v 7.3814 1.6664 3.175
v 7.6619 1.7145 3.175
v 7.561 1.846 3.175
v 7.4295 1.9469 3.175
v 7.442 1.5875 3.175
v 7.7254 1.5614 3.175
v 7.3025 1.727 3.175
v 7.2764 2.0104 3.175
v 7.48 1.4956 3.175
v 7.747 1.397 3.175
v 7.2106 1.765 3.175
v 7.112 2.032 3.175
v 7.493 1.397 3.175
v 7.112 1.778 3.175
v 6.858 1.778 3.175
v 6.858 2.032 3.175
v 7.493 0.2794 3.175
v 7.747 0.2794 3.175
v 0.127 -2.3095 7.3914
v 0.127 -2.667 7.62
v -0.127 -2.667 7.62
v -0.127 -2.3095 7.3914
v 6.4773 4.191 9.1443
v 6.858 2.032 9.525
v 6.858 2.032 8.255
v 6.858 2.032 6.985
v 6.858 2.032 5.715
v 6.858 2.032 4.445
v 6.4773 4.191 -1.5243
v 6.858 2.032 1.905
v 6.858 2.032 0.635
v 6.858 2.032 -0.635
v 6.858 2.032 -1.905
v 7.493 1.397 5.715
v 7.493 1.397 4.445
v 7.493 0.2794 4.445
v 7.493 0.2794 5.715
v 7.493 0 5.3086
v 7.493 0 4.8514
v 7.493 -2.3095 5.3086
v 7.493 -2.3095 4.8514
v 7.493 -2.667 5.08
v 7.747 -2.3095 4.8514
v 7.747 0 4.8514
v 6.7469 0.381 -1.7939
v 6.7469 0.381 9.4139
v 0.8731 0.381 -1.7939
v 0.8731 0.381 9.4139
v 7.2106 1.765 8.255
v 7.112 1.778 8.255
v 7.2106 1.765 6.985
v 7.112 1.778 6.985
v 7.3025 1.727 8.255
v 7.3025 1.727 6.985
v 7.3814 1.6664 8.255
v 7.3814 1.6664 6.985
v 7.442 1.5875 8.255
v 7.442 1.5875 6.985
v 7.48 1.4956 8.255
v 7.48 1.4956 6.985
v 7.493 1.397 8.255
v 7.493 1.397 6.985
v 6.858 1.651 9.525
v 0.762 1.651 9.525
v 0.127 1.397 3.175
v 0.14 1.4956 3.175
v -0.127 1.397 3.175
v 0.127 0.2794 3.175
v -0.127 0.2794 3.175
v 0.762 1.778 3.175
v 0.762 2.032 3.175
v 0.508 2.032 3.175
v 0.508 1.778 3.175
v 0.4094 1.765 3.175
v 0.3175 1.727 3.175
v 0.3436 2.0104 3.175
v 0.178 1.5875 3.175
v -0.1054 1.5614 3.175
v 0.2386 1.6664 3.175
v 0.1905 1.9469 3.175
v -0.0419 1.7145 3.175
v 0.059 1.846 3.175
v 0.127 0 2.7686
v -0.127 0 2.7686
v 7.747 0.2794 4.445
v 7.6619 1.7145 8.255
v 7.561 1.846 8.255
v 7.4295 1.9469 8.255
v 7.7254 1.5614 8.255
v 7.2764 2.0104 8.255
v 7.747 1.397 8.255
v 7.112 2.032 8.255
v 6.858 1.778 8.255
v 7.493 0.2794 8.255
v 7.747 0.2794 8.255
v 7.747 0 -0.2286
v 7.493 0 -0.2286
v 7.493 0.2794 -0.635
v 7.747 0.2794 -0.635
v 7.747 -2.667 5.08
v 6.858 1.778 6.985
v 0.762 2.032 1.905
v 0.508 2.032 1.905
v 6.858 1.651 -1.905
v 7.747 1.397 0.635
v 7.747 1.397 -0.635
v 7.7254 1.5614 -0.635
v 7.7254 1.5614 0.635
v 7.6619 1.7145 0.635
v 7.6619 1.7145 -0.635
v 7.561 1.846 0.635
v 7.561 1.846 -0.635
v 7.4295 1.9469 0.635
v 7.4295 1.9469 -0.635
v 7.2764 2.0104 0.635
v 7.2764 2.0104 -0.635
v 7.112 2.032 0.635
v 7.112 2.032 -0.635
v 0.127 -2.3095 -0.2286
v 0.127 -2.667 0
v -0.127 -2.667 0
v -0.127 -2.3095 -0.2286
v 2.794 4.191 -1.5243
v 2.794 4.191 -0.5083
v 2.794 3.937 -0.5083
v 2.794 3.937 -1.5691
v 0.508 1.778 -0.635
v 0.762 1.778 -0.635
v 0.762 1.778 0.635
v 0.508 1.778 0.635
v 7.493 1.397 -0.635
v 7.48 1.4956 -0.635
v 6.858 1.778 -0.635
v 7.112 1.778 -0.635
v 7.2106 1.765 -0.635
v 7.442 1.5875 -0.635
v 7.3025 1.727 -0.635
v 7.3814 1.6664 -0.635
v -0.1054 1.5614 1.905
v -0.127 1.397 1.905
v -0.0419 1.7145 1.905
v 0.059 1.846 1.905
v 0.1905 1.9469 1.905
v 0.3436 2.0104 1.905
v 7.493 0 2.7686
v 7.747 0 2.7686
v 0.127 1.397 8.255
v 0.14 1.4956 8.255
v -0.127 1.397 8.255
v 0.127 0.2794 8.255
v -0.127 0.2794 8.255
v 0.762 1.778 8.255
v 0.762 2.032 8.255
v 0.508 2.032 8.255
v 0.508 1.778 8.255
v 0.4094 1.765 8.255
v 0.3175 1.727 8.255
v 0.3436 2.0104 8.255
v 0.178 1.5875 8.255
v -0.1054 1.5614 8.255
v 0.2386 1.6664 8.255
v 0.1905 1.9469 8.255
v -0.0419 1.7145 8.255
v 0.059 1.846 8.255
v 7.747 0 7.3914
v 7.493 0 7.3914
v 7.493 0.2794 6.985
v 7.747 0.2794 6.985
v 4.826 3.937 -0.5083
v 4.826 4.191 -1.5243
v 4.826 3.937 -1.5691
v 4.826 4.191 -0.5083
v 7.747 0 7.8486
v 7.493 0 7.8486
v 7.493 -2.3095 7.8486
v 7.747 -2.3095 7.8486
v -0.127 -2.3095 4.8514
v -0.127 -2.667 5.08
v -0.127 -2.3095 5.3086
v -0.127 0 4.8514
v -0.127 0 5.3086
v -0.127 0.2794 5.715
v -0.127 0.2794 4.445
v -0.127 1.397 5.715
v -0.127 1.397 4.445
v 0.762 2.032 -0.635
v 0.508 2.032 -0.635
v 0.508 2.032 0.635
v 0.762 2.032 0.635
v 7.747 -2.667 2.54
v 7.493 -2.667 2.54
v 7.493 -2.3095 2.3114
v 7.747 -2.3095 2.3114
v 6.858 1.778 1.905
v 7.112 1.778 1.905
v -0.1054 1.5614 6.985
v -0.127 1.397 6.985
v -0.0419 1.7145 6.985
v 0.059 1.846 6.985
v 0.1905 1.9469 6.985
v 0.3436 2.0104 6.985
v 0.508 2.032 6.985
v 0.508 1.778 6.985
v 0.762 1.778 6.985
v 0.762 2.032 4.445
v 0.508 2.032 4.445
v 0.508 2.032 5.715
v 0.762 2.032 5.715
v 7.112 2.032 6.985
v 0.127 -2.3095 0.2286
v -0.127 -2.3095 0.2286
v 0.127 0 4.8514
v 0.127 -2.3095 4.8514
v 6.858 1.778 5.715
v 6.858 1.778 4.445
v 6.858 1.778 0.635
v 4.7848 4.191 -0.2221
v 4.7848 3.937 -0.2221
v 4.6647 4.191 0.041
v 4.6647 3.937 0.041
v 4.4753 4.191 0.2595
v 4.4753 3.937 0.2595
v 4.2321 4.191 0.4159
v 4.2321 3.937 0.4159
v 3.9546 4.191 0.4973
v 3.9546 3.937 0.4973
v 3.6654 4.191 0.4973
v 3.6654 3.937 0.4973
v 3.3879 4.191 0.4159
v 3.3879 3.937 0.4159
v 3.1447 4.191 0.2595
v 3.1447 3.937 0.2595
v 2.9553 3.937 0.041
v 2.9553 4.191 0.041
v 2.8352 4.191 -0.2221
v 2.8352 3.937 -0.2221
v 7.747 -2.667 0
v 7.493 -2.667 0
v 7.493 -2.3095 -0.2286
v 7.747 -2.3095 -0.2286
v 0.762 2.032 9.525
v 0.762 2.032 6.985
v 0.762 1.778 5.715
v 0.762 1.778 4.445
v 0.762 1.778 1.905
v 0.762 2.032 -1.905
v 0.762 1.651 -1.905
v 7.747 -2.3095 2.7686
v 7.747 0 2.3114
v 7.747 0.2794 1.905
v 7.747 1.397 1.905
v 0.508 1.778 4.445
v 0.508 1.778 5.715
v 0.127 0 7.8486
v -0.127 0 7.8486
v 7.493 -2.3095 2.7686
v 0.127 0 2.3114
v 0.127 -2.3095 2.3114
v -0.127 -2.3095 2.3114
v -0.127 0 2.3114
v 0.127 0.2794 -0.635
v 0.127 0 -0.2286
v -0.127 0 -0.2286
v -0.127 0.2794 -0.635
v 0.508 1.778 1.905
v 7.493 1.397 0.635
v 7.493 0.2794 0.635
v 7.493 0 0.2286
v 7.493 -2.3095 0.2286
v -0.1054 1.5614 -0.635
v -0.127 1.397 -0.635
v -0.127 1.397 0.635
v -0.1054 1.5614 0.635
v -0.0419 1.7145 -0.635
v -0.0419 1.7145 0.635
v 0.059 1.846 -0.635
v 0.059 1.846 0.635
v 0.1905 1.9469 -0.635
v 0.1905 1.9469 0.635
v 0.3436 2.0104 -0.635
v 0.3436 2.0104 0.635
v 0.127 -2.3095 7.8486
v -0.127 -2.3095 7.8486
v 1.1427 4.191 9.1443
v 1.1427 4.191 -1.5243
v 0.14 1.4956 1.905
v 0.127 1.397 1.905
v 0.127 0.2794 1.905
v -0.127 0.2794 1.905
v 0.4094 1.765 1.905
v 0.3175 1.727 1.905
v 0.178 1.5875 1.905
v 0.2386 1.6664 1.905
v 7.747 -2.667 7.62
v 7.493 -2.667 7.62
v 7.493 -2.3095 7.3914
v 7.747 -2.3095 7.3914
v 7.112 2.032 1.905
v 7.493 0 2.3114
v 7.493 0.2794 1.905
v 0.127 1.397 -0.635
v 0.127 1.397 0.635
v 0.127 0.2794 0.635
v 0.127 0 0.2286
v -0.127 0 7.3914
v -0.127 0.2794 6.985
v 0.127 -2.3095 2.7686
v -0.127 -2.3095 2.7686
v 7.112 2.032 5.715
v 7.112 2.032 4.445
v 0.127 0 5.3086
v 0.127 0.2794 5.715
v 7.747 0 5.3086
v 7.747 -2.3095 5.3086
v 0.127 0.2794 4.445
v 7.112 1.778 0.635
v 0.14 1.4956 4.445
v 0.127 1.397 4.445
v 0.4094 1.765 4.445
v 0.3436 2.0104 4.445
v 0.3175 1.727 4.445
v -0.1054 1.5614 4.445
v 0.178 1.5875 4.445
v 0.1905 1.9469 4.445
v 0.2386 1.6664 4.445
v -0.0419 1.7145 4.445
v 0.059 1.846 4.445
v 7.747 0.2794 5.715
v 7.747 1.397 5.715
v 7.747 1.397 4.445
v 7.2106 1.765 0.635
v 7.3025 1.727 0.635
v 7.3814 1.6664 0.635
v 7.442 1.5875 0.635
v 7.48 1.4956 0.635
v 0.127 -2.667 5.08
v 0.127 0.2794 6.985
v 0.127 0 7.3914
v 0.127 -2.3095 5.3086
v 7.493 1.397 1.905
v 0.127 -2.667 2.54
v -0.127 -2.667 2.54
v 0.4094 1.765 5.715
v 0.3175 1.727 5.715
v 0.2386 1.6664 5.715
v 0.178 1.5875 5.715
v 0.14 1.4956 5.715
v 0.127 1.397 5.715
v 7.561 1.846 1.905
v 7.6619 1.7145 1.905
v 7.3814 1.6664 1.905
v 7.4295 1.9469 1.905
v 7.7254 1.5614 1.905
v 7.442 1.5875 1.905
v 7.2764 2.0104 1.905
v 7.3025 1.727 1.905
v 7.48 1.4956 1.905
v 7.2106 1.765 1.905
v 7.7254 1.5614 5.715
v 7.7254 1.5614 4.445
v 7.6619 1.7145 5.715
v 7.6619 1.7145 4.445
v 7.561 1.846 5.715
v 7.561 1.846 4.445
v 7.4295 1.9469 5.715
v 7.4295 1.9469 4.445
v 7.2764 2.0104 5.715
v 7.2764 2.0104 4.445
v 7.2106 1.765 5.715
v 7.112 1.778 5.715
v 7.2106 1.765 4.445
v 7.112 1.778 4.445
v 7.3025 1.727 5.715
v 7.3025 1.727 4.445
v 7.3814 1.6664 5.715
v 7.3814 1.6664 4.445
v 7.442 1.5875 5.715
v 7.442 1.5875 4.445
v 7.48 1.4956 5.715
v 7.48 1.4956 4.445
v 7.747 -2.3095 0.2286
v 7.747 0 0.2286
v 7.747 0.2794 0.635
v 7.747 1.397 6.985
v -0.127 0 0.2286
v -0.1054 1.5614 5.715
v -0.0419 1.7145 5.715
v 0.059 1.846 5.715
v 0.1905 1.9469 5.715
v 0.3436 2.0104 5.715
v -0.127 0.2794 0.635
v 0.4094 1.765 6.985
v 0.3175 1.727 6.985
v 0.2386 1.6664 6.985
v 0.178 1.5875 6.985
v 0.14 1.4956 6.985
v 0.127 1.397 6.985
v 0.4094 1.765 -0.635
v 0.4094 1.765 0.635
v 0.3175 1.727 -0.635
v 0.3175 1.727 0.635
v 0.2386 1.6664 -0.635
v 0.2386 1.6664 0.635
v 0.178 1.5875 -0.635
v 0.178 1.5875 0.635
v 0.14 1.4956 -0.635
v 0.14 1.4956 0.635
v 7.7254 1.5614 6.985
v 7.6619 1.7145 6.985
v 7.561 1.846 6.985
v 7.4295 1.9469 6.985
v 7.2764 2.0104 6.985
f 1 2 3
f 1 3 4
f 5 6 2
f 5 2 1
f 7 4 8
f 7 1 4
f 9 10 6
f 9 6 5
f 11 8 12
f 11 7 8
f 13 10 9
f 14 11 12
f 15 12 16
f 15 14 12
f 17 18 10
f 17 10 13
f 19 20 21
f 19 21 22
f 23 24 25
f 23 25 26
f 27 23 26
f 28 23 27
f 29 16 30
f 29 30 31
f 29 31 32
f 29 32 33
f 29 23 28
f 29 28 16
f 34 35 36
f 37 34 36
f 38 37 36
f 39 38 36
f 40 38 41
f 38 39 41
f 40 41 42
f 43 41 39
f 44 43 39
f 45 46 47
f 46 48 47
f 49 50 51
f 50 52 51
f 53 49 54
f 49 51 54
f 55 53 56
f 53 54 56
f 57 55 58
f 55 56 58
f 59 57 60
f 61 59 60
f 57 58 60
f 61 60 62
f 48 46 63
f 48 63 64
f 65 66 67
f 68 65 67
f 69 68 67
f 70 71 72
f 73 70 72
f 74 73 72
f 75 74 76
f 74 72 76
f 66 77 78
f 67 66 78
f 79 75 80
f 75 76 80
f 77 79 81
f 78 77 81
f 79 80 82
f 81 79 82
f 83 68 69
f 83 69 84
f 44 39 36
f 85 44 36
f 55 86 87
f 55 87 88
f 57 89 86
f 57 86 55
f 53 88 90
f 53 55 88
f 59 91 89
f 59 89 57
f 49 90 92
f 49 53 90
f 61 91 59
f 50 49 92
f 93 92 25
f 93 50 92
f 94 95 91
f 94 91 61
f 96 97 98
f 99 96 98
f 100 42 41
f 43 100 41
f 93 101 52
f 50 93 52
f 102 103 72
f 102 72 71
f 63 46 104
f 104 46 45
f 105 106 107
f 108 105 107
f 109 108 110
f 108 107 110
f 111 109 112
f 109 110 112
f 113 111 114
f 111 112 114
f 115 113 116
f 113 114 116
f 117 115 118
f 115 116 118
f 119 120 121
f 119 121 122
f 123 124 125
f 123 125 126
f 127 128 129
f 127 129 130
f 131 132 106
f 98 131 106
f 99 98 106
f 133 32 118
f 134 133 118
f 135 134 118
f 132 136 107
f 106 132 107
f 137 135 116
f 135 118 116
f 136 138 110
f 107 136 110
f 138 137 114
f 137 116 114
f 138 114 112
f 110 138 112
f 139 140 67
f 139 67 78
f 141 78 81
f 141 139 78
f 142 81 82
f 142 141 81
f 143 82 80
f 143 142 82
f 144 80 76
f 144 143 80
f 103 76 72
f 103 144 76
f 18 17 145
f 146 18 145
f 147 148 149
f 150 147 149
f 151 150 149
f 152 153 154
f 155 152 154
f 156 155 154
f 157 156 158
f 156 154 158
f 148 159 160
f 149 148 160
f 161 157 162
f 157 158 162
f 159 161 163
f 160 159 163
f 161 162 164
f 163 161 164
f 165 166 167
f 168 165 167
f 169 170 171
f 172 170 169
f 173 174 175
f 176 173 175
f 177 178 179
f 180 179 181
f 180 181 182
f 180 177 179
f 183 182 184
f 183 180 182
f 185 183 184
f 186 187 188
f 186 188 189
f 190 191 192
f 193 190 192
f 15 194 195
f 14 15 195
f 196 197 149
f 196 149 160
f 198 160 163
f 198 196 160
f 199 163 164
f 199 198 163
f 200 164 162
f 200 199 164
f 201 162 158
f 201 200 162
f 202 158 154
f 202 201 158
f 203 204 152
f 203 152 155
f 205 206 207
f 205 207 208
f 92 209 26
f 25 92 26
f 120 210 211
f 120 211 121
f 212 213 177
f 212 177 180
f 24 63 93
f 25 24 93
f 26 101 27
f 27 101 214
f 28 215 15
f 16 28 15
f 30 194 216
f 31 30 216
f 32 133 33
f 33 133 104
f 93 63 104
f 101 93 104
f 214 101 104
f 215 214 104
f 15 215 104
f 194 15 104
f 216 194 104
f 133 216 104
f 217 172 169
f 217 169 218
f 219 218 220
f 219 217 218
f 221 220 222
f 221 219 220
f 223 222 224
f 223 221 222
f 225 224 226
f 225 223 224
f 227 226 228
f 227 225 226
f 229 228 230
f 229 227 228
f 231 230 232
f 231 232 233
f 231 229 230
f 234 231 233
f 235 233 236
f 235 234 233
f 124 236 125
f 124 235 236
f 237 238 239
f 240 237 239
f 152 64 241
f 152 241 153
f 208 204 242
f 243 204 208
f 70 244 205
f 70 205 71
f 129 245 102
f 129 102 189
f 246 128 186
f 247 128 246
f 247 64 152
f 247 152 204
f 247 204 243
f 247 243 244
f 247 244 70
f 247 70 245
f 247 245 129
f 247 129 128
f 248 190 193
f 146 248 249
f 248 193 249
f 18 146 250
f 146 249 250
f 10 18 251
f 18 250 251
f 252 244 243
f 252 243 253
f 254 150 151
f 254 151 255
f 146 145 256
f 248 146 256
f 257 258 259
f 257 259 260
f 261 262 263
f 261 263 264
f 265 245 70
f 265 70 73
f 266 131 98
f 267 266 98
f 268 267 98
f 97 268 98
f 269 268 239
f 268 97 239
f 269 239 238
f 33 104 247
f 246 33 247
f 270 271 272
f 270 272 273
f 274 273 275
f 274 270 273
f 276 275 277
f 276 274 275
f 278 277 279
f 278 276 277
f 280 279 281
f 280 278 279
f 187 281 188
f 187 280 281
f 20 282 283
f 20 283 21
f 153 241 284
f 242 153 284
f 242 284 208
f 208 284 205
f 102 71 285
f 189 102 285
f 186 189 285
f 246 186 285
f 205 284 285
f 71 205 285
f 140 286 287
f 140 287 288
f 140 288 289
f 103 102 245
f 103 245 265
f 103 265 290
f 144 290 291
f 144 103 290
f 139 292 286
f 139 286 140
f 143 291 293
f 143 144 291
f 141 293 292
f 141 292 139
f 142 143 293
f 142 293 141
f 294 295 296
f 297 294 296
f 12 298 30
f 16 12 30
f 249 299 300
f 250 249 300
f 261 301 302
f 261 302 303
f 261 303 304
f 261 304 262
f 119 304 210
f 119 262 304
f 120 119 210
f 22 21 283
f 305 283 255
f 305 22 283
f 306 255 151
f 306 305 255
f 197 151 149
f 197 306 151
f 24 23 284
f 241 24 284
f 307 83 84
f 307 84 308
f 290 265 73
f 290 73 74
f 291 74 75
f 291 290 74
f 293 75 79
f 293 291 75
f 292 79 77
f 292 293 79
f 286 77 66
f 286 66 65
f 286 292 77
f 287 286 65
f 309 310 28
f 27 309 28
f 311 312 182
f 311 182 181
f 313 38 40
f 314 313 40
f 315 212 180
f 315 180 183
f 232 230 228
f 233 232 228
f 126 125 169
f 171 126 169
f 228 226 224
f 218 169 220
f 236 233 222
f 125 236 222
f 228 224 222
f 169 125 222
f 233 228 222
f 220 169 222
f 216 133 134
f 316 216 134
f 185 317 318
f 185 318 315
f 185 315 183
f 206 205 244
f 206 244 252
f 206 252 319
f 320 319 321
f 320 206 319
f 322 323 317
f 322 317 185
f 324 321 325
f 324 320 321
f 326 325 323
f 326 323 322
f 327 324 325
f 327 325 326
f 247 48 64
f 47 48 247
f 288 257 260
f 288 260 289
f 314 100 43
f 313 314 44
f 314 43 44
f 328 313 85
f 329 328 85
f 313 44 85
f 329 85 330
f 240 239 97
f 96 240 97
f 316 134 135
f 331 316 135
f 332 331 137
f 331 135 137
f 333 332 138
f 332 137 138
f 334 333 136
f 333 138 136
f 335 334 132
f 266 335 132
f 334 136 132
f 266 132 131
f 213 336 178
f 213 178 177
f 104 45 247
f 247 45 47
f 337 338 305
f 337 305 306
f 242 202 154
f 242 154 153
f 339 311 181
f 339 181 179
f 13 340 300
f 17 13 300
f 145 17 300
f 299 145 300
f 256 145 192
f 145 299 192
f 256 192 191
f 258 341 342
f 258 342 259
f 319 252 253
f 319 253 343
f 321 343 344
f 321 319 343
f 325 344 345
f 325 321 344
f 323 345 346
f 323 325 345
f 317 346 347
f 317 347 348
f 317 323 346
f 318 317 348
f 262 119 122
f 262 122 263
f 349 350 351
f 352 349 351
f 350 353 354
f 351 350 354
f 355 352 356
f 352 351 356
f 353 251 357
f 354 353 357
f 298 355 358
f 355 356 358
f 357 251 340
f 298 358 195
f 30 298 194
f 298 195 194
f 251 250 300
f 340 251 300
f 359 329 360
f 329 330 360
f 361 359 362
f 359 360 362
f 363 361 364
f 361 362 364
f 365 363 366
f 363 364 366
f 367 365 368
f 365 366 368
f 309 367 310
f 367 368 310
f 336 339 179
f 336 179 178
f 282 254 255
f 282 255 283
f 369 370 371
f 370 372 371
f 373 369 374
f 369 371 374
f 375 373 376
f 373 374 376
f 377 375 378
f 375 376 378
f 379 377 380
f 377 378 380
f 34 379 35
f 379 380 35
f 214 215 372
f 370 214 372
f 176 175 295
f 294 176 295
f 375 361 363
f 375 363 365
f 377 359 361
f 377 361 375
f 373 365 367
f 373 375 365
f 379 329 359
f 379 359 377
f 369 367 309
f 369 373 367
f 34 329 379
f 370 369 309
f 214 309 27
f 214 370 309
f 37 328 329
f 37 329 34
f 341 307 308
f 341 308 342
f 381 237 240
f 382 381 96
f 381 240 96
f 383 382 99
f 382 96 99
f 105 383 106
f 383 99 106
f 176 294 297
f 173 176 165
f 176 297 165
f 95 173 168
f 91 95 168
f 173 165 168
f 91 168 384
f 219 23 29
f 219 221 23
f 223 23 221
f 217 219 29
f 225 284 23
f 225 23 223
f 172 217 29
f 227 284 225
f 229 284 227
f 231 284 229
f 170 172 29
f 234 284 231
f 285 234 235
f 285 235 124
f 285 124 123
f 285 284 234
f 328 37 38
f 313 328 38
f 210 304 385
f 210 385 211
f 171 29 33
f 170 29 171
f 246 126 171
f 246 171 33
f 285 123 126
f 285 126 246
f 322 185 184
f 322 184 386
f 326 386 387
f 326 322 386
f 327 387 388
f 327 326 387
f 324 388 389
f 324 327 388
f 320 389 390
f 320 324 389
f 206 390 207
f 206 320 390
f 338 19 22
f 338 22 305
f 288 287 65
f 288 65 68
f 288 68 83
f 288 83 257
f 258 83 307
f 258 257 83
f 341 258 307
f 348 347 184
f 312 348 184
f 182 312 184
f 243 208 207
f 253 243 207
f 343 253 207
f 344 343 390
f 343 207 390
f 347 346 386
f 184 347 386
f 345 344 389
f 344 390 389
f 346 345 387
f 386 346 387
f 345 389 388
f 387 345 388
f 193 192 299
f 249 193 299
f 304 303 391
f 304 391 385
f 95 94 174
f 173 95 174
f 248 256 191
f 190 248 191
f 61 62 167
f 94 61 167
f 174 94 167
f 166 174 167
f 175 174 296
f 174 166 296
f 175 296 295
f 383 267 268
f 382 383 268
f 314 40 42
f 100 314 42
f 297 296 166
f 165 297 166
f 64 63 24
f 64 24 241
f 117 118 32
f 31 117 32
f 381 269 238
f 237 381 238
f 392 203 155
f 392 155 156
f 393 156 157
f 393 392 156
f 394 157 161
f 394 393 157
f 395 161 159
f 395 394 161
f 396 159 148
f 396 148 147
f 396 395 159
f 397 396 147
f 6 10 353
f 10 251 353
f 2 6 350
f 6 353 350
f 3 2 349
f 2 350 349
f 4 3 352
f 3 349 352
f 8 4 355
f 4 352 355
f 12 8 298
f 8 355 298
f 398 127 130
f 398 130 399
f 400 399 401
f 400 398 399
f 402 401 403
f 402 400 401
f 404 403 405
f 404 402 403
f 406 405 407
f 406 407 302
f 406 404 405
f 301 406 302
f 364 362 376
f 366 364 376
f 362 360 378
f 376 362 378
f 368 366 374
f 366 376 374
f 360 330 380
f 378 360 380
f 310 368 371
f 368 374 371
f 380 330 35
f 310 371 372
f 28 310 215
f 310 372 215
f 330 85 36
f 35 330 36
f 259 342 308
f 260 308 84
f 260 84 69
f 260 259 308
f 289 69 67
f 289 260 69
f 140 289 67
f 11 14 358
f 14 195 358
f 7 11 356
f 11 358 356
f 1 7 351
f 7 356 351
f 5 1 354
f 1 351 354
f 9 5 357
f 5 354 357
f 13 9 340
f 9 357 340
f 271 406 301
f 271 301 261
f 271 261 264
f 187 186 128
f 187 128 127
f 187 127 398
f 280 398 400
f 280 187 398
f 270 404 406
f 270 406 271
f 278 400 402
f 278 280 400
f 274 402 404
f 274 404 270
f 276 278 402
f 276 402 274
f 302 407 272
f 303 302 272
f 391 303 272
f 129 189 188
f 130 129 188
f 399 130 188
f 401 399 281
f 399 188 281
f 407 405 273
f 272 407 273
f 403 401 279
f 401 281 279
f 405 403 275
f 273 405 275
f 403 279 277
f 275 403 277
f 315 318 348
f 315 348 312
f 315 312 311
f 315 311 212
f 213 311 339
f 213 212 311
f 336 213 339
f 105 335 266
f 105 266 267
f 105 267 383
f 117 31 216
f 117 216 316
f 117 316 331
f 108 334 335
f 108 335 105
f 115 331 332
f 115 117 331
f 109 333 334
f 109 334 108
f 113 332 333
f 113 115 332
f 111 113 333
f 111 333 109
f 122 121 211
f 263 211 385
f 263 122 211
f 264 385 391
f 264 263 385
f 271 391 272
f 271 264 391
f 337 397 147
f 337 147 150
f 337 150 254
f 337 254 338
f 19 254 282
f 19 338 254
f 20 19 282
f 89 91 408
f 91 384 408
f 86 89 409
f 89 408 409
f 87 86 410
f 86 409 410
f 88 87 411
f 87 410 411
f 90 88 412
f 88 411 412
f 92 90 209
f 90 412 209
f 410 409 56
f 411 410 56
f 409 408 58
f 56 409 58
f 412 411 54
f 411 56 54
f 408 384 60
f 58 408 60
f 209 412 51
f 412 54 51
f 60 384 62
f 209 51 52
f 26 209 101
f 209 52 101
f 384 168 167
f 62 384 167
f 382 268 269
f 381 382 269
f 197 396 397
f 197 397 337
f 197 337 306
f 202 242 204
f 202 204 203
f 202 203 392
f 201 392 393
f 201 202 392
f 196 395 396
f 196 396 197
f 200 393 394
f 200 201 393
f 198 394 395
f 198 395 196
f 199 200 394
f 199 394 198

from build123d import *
from OCP.BRepFilletAPI import BRepFilletAPI_MakeChamfer

# Parameters (mm, degrees)
SKETCH1_W                = 11.43
SKETCH1_H                = 6.096
BASE_EXTRUDE_DEPTH       = 3.81
CHAMFER1_SIZE            = 2.159
CHAMFER1_SIZE2           = 0.380689951
CHAMFER2_SIZE            = 1.27
CHAMFER2_SIZE2           = 0.111110603
CUT_EXTRUDE1_DEPTH       = 0.254
BOSS_EXTRUDE_THIN1_DEPTH = 0.635
CUT_EXTRUDE2_DEPTH       = 0.254
CUT_EXTRUDE3_DEPTH       = 0.254
LPATTERN1_COUNT          = 4
LPATTERN1_PITCH          = 2.54
MIRROR1_COPY_1_DEPTH     = 0.635
MIRROR1_COPY_2_DEPTH     = 0.635
MIRROR1_COPY_3_DEPTH     = 0.635
MIRROR1_COPY_4_DEPTH     = 0.254
MIRROR1_COPY_5_DEPTH     = 0.254
MIRROR1_COPY_6_DEPTH     = 0.254
MIRROR1_COPY_7_DEPTH     = 0.254
MIRROR1_COPY_8_DEPTH     = 0.254
MIRROR1_COPY_9_DEPTH     = 0.254


with BuildPart() as part:
    # Sketch1 → Base-Extrude (new body)
    with BuildSketch(Plane(origin=(0, 0.381, 0), x_dir=(0, 0, -1), z_dir=(0, 1, 0))):
        with Locations((-3.81, -3.81)):
            Rectangle(SKETCH1_W, SKETCH1_H)
    extrude(amount=BASE_EXTRUDE_DEPTH)

    # Chamfer1: one chamfer whose edges measure the first distance from different faces: ONE call of the kernel's chamfer builder (chamfer() names one face for all edges)
    chamfer1_edges_1 = [part.edges().sort_by_distance(p)[0] for p in [
        (3.81, 4.191, 9.525),
    ]]
    chamfer1_side_1 = [part.faces().sort_by_distance(p)[0] for p in [
        (3.81, 2.286, 9.525),
    ]]
    chamfer1_edges_2 = [part.edges().sort_by_distance(p)[0] for p in [
        (6.858, 4.191, 3.81),
    ]]
    chamfer1_side_2 = [part.faces().sort_by_distance(p)[0] for p in [
        (6.858, 2.286, 3.81),
    ]]
    chamfer1_edges_3 = [part.edges().sort_by_distance(p)[0] for p in [
        (3.81, 4.191, -1.905),
    ]]
    chamfer1_side_3 = [part.faces().sort_by_distance(p)[0] for p in [
        (3.81, 2.286, -1.905),
    ]]
    chamfer1_edges_4 = [part.edges().sort_by_distance(p)[0] for p in [
        (0.762, 4.191, 3.81),
    ]]
    chamfer1_side_4 = [part.faces().sort_by_distance(p)[0] for p in [
        (0.762, 2.286, 3.81),
    ]]
    chamfer1 = BRepFilletAPI_MakeChamfer(part.part.solid().wrapped)
    for e in chamfer1_edges_1:
        chamfer1.Add(CHAMFER1_SIZE, CHAMFER1_SIZE2, e.wrapped, chamfer1_side_1[0].wrapped)  # the first distance lies on this face
    for e in chamfer1_edges_2:
        chamfer1.Add(CHAMFER1_SIZE, CHAMFER1_SIZE2, e.wrapped, chamfer1_side_2[0].wrapped)  # the first distance lies on this face
    for e in chamfer1_edges_3:
        chamfer1.Add(CHAMFER1_SIZE, CHAMFER1_SIZE2, e.wrapped, chamfer1_side_3[0].wrapped)  # the first distance lies on this face
    for e in chamfer1_edges_4:
        chamfer1.Add(CHAMFER1_SIZE, CHAMFER1_SIZE2, e.wrapped, chamfer1_side_4[0].wrapped)  # the first distance lies on this face
    add(Compound.cast(chamfer1.Shape()), mode=Mode.REPLACE)

    # Chamfer2: one chamfer whose edges measure the first distance from different faces: ONE call of the kernel's chamfer builder (chamfer() names one face for all edges)
    chamfer2_edges_1 = [part.edges().sort_by_distance(p)[0] for p in [
        (6.858, 0.381, 3.81),
    ]]
    chamfer2_side_1 = [part.faces().sort_by_distance(p)[0] for p in [
        (6.858, 1.2065, 3.81),
    ]]
    chamfer2_edges_2 = [part.edges().sort_by_distance(p)[0] for p in [
        (3.81, 0.381, 9.525),
    ]]
    chamfer2_side_2 = [part.faces().sort_by_distance(p)[0] for p in [
        (3.81, 1.2065, 9.525),
    ]]
    chamfer2_edges_3 = [part.edges().sort_by_distance(p)[0] for p in [
        (0.762, 0.381, 3.81),
    ]]
    chamfer2_side_3 = [part.faces().sort_by_distance(p)[0] for p in [
        (0.762, 1.2065, 3.81),
    ]]
    chamfer2_edges_4 = [part.edges().sort_by_distance(p)[0] for p in [
        (3.81, 0.381, -1.905),
    ]]
    chamfer2_side_4 = [part.faces().sort_by_distance(p)[0] for p in [
        (3.81, 1.2065, -1.905),
    ]]
    chamfer2 = BRepFilletAPI_MakeChamfer(part.part.solid().wrapped)
    for e in chamfer2_edges_1:
        chamfer2.Add(CHAMFER2_SIZE, CHAMFER2_SIZE2, e.wrapped, chamfer2_side_1[0].wrapped)  # the first distance lies on this face
    for e in chamfer2_edges_2:
        chamfer2.Add(CHAMFER2_SIZE, CHAMFER2_SIZE2, e.wrapped, chamfer2_side_2[0].wrapped)  # the first distance lies on this face
    for e in chamfer2_edges_3:
        chamfer2.Add(CHAMFER2_SIZE, CHAMFER2_SIZE2, e.wrapped, chamfer2_side_3[0].wrapped)  # the first distance lies on this face
    for e in chamfer2_edges_4:
        chamfer2.Add(CHAMFER2_SIZE, CHAMFER2_SIZE2, e.wrapped, chamfer2_side_4[0].wrapped)  # the first distance lies on this face
    add(Compound.cast(chamfer2.Shape()), mode=Mode.REPLACE)

    # Sketch2 → Cut-Extrude1 (cut)
    with BuildSketch(Plane(origin=(0, 4.191, 0), x_dir=(-1, 0, 0), z_dir=(0, 1, 0))):
        with BuildLine():
            Line((-2.794, -2.791910465), (-4.826, -2.791910465))
            Line((-4.826, -2.791910465), (-4.826, -0.508310049))
            ThreePointArc((-4.826, -0.508310049), (-3.81, 0.507689951), (-2.794, -0.508310049))
            Line((-2.794, -0.508310049), (-2.794, -2.791910465))
        make_face()
    extrude(amount=-CUT_EXTRUDE1_DEPTH, mode=Mode.SUBTRACT)

    # Sketch3 → Boss-Extrude-Thin1 (add, symmetric)
    with BuildSketch(Plane(origin=(9.017, 0, 0), x_dir=(-1, 0, 0), z_dir=(0, 0, -1))):
        with BuildLine():
            Line((6.913298214, 1.778), (8.509, 1.778))
            ThreePointArc((8.509, 1.778), (8.778407684, 1.666407684), (8.89, 1.397))
            Line((8.89, 1.397), (8.89, -2.667))
            Line((8.89, -2.667), (9.144, -2.667))
            Line((9.144, -2.667), (9.144, 1.397))
            ThreePointArc((9.144, 1.397), (8.958012806, 1.846012806), (8.509, 2.032))
            Line((8.509, 2.032), (6.913298214, 2.032))
            Line((6.913298214, 2.032), (6.913298214, 1.778))
        make_face()
    boss_extrude_thin1 = extrude(amount=BOSS_EXTRUDE_THIN1_DEPTH, both=True)

    # Sketch4 → Cut-Extrude2 (cut)
    with BuildSketch(Plane(origin=(0.127, 0, 0), x_dir=(0, 0, -1), z_dir=(1, 0, 0))):
        Polygon((-0.635, 0.2794), (-0.2286, 0), (-0.2286, -2.309519874), (0, -2.667), (-0.635, -2.667), align=None)
    cut_extrude2 = extrude(amount=-CUT_EXTRUDE2_DEPTH, mode=Mode.SUBTRACT)

    # Sketch5 → Cut-Extrude3 (cut)
    with BuildSketch(Plane(origin=(0.127, 0, 0), x_dir=(0, 0, -1), z_dir=(1, 0, 0))):
        Polygon((0.635, -2.667), (0, -2.667), (0.2286, -2.309519874), (0.2286, 0), (0.635, 0.2794), align=None)
    cut_extrude3 = extrude(amount=-CUT_EXTRUDE3_DEPTH, mode=Mode.SUBTRACT)

    # LPattern1: Boss-Extrude-Thin1, Cut-Extrude2, Cut-Extrude3 ×4
    with Locations(*[(0, 0, i * LPATTERN1_PITCH) for i in range(1, LPATTERN1_COUNT)]):
        add(boss_extrude_thin1)
        add(cut_extrude2, mode=Mode.SUBTRACT)
        add(cut_extrude3, mode=Mode.SUBTRACT)

    # Mirror1: Boss-Extrude-Thin1, Cut-Extrude2, Cut-Extrude3 across plane
    add(boss_extrude_thin1.mirror(Plane.ZY.offset(-3.81)))
    add(cut_extrude2.mirror(Plane.ZY.offset(-3.81)), mode=Mode.SUBTRACT)
    add(cut_extrude3.mirror(Plane.ZY.offset(-3.81)), mode=Mode.SUBTRACT)

    # Mirror1 copy 1 sketch → Mirror1 copy 1 (add, symmetric)
    with BuildSketch(Plane(origin=(-1.397, 0, 2.54), x_dir=(1, 0, 0), z_dir=(0, 0, -1))):
        with BuildLine():
            Line((6.913298214, -1.778), (8.509, -1.778))
            ThreePointArc((8.509, -1.778), (8.778407684, -1.666407684), (8.89, -1.397))
            Line((8.89, -1.397), (8.89, 2.667))
            Line((8.89, 2.667), (9.144, 2.667))
            Line((9.144, 2.667), (9.144, -1.397))
            ThreePointArc((9.144, -1.397), (8.958012806, -1.846012806), (8.509, -2.032))
            Line((8.509, -2.032), (6.913298214, -2.032))
            Line((6.913298214, -2.032), (6.913298214, -1.778))
        make_face()
    extrude(amount=MIRROR1_COPY_1_DEPTH, both=True)

    # Mirror1 copy 2 sketch → Mirror1 copy 2 (add, symmetric)
    with BuildSketch(Plane(origin=(-1.397, 0, 5.08), x_dir=(1, 0, 0), z_dir=(0, 0, -1))):
        with BuildLine():
            Line((6.913298214, -1.778), (8.509, -1.778))
            ThreePointArc((8.509, -1.778), (8.778407684, -1.666407684), (8.89, -1.397))
            Line((8.89, -1.397), (8.89, 2.667))
            Line((8.89, 2.667), (9.144, 2.667))
            Line((9.144, 2.667), (9.144, -1.397))
            ThreePointArc((9.144, -1.397), (8.958012806, -1.846012806), (8.509, -2.032))
            Line((8.509, -2.032), (6.913298214, -2.032))
            Line((6.913298214, -2.032), (6.913298214, -1.778))
        make_face()
    extrude(amount=MIRROR1_COPY_2_DEPTH, both=True)

    # Mirror1 copy 3 sketch → Mirror1 copy 3 (add, symmetric)
    with BuildSketch(Plane(origin=(-1.397, 0, 7.62), x_dir=(1, 0, 0), z_dir=(0, 0, -1))):
        with BuildLine():
            Line((6.913298214, -1.778), (8.509, -1.778))
            ThreePointArc((8.509, -1.778), (8.778407684, -1.666407684), (8.89, -1.397))
            Line((8.89, -1.397), (8.89, 2.667))
            Line((8.89, 2.667), (9.144, 2.667))
            Line((9.144, 2.667), (9.144, -1.397))
            ThreePointArc((9.144, -1.397), (8.958012806, -1.846012806), (8.509, -2.032))
            Line((8.509, -2.032), (6.913298214, -2.032))
            Line((6.913298214, -2.032), (6.913298214, -1.778))
        make_face()
    extrude(amount=MIRROR1_COPY_3_DEPTH, both=True)

    # Mirror1 copy 4 sketch → Mirror1 copy 4 (cut)
    with BuildSketch(Plane(origin=(7.493, 0, 2.54), x_dir=(0, 0, -1), z_dir=(-1, 0, 0))):
        Polygon((-0.635, -0.2794), (-0.2286, 0), (-0.2286, 2.309519874), (0, 2.667), (-0.635, 2.667), align=None)
    extrude(amount=-MIRROR1_COPY_4_DEPTH, mode=Mode.SUBTRACT)

    # Mirror1 copy 5 sketch → Mirror1 copy 5 (cut)
    with BuildSketch(Plane(origin=(7.493, 0, 5.08), x_dir=(0, 0, -1), z_dir=(-1, 0, 0))):
        Polygon((-0.635, -0.2794), (-0.2286, 0), (-0.2286, 2.309519874), (0, 2.667), (-0.635, 2.667), align=None)
    extrude(amount=-MIRROR1_COPY_5_DEPTH, mode=Mode.SUBTRACT)

    # Mirror1 copy 6 sketch → Mirror1 copy 6 (cut)
    with BuildSketch(Plane(origin=(7.493, 0, 7.62), x_dir=(0, 0, -1), z_dir=(-1, 0, 0))):
        Polygon((-0.635, -0.2794), (-0.2286, 0), (-0.2286, 2.309519874), (0, 2.667), (-0.635, 2.667), align=None)
    extrude(amount=-MIRROR1_COPY_6_DEPTH, mode=Mode.SUBTRACT)

    # Mirror1 copy 7 sketch → Mirror1 copy 7 (cut)
    with BuildSketch(Plane(origin=(7.493, 0, 2.54), x_dir=(0, 0, -1), z_dir=(-1, 0, 0))):
        Polygon((0.635, 2.667), (0, 2.667), (0.2286, 2.309519874), (0.2286, 0), (0.635, -0.2794), align=None)
    extrude(amount=-MIRROR1_COPY_7_DEPTH, mode=Mode.SUBTRACT)

    # Mirror1 copy 8 sketch → Mirror1 copy 8 (cut)
    with BuildSketch(Plane(origin=(7.493, 0, 5.08), x_dir=(0, 0, -1), z_dir=(-1, 0, 0))):
        Polygon((0.635, 2.667), (0, 2.667), (0.2286, 2.309519874), (0.2286, 0), (0.635, -0.2794), align=None)
    extrude(amount=-MIRROR1_COPY_8_DEPTH, mode=Mode.SUBTRACT)

    # Mirror1 copy 9 sketch → Mirror1 copy 9 (cut)
    with BuildSketch(Plane(origin=(7.493, 0, 7.62), x_dir=(0, 0, -1), z_dir=(-1, 0, 0))):
        Polygon((0.635, 2.667), (0, 2.667), (0.2286, 2.309519874), (0.2286, 0), (0.635, -0.2794), align=None)
    extrude(amount=-MIRROR1_COPY_9_DEPTH, mode=Mode.SUBTRACT)


solid = part.part
